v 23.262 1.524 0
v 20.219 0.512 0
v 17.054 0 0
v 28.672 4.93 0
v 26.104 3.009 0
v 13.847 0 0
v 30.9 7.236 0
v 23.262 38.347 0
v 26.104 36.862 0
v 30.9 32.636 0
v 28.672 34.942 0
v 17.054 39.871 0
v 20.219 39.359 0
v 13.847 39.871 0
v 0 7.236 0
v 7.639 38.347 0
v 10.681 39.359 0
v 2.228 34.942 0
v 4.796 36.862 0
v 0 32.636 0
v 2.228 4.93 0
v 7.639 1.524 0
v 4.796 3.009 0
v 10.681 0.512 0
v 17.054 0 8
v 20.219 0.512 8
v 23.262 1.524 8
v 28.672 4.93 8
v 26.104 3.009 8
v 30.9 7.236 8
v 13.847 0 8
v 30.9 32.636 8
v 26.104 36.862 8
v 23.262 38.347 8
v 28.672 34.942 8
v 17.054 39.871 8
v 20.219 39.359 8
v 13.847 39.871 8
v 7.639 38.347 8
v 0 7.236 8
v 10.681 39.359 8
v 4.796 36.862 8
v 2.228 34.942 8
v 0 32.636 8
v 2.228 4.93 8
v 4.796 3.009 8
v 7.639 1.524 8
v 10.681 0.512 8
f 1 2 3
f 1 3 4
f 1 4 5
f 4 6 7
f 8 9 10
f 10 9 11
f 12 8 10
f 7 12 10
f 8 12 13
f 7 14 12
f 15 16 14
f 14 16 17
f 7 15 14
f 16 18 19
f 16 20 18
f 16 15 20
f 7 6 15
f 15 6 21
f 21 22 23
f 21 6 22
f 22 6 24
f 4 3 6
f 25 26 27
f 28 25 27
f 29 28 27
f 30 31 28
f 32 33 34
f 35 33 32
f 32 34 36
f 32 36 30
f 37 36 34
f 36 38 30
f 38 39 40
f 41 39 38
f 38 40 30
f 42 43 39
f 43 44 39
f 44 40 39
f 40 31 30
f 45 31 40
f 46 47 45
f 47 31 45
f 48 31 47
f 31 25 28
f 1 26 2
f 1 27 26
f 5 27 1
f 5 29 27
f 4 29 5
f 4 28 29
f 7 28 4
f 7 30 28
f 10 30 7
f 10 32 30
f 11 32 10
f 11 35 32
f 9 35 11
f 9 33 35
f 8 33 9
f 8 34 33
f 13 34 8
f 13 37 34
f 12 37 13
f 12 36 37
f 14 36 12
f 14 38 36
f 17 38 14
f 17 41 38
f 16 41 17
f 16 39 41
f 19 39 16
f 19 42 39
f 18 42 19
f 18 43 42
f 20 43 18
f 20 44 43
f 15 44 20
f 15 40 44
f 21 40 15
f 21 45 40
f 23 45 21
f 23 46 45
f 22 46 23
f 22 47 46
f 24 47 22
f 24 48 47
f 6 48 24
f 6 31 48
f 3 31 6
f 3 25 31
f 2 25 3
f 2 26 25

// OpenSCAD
$fn = 32;

// ----------------------------------------------------------------------
// Flat adaptor: double_d, 8 mm thick
// ----------------------------------------------------------------------

// --- parameters (mm) ---
profile_height = 8;       // extrusion height
profile_points = 24;      // points of the closed outline

profile = [[30.9, 32.636], [28.672, 34.942], [26.104, 36.862], [23.262, 38.347], [20.219, 39.359], [17.054, 39.871], [13.847, 39.871], [10.681, 39.359], [7.639, 38.347], [4.796, 36.862], [2.228, 34.942], [0, 32.636], [0, 7.236], [2.228, 4.93], [4.796, 3.009], [7.639, 1.524], [10.681, 0.512], [13.847, 0], [17.054, 0], [20.219, 0.512], [23.262, 1.524], [26.104, 3.009], [28.672, 4.93], [30.9, 7.236]];  // single closed polygon, 24 points, counter clockwise

// --- the one profile operation ---
linear_extrude(height = profile_height) polygon(points = profile);
